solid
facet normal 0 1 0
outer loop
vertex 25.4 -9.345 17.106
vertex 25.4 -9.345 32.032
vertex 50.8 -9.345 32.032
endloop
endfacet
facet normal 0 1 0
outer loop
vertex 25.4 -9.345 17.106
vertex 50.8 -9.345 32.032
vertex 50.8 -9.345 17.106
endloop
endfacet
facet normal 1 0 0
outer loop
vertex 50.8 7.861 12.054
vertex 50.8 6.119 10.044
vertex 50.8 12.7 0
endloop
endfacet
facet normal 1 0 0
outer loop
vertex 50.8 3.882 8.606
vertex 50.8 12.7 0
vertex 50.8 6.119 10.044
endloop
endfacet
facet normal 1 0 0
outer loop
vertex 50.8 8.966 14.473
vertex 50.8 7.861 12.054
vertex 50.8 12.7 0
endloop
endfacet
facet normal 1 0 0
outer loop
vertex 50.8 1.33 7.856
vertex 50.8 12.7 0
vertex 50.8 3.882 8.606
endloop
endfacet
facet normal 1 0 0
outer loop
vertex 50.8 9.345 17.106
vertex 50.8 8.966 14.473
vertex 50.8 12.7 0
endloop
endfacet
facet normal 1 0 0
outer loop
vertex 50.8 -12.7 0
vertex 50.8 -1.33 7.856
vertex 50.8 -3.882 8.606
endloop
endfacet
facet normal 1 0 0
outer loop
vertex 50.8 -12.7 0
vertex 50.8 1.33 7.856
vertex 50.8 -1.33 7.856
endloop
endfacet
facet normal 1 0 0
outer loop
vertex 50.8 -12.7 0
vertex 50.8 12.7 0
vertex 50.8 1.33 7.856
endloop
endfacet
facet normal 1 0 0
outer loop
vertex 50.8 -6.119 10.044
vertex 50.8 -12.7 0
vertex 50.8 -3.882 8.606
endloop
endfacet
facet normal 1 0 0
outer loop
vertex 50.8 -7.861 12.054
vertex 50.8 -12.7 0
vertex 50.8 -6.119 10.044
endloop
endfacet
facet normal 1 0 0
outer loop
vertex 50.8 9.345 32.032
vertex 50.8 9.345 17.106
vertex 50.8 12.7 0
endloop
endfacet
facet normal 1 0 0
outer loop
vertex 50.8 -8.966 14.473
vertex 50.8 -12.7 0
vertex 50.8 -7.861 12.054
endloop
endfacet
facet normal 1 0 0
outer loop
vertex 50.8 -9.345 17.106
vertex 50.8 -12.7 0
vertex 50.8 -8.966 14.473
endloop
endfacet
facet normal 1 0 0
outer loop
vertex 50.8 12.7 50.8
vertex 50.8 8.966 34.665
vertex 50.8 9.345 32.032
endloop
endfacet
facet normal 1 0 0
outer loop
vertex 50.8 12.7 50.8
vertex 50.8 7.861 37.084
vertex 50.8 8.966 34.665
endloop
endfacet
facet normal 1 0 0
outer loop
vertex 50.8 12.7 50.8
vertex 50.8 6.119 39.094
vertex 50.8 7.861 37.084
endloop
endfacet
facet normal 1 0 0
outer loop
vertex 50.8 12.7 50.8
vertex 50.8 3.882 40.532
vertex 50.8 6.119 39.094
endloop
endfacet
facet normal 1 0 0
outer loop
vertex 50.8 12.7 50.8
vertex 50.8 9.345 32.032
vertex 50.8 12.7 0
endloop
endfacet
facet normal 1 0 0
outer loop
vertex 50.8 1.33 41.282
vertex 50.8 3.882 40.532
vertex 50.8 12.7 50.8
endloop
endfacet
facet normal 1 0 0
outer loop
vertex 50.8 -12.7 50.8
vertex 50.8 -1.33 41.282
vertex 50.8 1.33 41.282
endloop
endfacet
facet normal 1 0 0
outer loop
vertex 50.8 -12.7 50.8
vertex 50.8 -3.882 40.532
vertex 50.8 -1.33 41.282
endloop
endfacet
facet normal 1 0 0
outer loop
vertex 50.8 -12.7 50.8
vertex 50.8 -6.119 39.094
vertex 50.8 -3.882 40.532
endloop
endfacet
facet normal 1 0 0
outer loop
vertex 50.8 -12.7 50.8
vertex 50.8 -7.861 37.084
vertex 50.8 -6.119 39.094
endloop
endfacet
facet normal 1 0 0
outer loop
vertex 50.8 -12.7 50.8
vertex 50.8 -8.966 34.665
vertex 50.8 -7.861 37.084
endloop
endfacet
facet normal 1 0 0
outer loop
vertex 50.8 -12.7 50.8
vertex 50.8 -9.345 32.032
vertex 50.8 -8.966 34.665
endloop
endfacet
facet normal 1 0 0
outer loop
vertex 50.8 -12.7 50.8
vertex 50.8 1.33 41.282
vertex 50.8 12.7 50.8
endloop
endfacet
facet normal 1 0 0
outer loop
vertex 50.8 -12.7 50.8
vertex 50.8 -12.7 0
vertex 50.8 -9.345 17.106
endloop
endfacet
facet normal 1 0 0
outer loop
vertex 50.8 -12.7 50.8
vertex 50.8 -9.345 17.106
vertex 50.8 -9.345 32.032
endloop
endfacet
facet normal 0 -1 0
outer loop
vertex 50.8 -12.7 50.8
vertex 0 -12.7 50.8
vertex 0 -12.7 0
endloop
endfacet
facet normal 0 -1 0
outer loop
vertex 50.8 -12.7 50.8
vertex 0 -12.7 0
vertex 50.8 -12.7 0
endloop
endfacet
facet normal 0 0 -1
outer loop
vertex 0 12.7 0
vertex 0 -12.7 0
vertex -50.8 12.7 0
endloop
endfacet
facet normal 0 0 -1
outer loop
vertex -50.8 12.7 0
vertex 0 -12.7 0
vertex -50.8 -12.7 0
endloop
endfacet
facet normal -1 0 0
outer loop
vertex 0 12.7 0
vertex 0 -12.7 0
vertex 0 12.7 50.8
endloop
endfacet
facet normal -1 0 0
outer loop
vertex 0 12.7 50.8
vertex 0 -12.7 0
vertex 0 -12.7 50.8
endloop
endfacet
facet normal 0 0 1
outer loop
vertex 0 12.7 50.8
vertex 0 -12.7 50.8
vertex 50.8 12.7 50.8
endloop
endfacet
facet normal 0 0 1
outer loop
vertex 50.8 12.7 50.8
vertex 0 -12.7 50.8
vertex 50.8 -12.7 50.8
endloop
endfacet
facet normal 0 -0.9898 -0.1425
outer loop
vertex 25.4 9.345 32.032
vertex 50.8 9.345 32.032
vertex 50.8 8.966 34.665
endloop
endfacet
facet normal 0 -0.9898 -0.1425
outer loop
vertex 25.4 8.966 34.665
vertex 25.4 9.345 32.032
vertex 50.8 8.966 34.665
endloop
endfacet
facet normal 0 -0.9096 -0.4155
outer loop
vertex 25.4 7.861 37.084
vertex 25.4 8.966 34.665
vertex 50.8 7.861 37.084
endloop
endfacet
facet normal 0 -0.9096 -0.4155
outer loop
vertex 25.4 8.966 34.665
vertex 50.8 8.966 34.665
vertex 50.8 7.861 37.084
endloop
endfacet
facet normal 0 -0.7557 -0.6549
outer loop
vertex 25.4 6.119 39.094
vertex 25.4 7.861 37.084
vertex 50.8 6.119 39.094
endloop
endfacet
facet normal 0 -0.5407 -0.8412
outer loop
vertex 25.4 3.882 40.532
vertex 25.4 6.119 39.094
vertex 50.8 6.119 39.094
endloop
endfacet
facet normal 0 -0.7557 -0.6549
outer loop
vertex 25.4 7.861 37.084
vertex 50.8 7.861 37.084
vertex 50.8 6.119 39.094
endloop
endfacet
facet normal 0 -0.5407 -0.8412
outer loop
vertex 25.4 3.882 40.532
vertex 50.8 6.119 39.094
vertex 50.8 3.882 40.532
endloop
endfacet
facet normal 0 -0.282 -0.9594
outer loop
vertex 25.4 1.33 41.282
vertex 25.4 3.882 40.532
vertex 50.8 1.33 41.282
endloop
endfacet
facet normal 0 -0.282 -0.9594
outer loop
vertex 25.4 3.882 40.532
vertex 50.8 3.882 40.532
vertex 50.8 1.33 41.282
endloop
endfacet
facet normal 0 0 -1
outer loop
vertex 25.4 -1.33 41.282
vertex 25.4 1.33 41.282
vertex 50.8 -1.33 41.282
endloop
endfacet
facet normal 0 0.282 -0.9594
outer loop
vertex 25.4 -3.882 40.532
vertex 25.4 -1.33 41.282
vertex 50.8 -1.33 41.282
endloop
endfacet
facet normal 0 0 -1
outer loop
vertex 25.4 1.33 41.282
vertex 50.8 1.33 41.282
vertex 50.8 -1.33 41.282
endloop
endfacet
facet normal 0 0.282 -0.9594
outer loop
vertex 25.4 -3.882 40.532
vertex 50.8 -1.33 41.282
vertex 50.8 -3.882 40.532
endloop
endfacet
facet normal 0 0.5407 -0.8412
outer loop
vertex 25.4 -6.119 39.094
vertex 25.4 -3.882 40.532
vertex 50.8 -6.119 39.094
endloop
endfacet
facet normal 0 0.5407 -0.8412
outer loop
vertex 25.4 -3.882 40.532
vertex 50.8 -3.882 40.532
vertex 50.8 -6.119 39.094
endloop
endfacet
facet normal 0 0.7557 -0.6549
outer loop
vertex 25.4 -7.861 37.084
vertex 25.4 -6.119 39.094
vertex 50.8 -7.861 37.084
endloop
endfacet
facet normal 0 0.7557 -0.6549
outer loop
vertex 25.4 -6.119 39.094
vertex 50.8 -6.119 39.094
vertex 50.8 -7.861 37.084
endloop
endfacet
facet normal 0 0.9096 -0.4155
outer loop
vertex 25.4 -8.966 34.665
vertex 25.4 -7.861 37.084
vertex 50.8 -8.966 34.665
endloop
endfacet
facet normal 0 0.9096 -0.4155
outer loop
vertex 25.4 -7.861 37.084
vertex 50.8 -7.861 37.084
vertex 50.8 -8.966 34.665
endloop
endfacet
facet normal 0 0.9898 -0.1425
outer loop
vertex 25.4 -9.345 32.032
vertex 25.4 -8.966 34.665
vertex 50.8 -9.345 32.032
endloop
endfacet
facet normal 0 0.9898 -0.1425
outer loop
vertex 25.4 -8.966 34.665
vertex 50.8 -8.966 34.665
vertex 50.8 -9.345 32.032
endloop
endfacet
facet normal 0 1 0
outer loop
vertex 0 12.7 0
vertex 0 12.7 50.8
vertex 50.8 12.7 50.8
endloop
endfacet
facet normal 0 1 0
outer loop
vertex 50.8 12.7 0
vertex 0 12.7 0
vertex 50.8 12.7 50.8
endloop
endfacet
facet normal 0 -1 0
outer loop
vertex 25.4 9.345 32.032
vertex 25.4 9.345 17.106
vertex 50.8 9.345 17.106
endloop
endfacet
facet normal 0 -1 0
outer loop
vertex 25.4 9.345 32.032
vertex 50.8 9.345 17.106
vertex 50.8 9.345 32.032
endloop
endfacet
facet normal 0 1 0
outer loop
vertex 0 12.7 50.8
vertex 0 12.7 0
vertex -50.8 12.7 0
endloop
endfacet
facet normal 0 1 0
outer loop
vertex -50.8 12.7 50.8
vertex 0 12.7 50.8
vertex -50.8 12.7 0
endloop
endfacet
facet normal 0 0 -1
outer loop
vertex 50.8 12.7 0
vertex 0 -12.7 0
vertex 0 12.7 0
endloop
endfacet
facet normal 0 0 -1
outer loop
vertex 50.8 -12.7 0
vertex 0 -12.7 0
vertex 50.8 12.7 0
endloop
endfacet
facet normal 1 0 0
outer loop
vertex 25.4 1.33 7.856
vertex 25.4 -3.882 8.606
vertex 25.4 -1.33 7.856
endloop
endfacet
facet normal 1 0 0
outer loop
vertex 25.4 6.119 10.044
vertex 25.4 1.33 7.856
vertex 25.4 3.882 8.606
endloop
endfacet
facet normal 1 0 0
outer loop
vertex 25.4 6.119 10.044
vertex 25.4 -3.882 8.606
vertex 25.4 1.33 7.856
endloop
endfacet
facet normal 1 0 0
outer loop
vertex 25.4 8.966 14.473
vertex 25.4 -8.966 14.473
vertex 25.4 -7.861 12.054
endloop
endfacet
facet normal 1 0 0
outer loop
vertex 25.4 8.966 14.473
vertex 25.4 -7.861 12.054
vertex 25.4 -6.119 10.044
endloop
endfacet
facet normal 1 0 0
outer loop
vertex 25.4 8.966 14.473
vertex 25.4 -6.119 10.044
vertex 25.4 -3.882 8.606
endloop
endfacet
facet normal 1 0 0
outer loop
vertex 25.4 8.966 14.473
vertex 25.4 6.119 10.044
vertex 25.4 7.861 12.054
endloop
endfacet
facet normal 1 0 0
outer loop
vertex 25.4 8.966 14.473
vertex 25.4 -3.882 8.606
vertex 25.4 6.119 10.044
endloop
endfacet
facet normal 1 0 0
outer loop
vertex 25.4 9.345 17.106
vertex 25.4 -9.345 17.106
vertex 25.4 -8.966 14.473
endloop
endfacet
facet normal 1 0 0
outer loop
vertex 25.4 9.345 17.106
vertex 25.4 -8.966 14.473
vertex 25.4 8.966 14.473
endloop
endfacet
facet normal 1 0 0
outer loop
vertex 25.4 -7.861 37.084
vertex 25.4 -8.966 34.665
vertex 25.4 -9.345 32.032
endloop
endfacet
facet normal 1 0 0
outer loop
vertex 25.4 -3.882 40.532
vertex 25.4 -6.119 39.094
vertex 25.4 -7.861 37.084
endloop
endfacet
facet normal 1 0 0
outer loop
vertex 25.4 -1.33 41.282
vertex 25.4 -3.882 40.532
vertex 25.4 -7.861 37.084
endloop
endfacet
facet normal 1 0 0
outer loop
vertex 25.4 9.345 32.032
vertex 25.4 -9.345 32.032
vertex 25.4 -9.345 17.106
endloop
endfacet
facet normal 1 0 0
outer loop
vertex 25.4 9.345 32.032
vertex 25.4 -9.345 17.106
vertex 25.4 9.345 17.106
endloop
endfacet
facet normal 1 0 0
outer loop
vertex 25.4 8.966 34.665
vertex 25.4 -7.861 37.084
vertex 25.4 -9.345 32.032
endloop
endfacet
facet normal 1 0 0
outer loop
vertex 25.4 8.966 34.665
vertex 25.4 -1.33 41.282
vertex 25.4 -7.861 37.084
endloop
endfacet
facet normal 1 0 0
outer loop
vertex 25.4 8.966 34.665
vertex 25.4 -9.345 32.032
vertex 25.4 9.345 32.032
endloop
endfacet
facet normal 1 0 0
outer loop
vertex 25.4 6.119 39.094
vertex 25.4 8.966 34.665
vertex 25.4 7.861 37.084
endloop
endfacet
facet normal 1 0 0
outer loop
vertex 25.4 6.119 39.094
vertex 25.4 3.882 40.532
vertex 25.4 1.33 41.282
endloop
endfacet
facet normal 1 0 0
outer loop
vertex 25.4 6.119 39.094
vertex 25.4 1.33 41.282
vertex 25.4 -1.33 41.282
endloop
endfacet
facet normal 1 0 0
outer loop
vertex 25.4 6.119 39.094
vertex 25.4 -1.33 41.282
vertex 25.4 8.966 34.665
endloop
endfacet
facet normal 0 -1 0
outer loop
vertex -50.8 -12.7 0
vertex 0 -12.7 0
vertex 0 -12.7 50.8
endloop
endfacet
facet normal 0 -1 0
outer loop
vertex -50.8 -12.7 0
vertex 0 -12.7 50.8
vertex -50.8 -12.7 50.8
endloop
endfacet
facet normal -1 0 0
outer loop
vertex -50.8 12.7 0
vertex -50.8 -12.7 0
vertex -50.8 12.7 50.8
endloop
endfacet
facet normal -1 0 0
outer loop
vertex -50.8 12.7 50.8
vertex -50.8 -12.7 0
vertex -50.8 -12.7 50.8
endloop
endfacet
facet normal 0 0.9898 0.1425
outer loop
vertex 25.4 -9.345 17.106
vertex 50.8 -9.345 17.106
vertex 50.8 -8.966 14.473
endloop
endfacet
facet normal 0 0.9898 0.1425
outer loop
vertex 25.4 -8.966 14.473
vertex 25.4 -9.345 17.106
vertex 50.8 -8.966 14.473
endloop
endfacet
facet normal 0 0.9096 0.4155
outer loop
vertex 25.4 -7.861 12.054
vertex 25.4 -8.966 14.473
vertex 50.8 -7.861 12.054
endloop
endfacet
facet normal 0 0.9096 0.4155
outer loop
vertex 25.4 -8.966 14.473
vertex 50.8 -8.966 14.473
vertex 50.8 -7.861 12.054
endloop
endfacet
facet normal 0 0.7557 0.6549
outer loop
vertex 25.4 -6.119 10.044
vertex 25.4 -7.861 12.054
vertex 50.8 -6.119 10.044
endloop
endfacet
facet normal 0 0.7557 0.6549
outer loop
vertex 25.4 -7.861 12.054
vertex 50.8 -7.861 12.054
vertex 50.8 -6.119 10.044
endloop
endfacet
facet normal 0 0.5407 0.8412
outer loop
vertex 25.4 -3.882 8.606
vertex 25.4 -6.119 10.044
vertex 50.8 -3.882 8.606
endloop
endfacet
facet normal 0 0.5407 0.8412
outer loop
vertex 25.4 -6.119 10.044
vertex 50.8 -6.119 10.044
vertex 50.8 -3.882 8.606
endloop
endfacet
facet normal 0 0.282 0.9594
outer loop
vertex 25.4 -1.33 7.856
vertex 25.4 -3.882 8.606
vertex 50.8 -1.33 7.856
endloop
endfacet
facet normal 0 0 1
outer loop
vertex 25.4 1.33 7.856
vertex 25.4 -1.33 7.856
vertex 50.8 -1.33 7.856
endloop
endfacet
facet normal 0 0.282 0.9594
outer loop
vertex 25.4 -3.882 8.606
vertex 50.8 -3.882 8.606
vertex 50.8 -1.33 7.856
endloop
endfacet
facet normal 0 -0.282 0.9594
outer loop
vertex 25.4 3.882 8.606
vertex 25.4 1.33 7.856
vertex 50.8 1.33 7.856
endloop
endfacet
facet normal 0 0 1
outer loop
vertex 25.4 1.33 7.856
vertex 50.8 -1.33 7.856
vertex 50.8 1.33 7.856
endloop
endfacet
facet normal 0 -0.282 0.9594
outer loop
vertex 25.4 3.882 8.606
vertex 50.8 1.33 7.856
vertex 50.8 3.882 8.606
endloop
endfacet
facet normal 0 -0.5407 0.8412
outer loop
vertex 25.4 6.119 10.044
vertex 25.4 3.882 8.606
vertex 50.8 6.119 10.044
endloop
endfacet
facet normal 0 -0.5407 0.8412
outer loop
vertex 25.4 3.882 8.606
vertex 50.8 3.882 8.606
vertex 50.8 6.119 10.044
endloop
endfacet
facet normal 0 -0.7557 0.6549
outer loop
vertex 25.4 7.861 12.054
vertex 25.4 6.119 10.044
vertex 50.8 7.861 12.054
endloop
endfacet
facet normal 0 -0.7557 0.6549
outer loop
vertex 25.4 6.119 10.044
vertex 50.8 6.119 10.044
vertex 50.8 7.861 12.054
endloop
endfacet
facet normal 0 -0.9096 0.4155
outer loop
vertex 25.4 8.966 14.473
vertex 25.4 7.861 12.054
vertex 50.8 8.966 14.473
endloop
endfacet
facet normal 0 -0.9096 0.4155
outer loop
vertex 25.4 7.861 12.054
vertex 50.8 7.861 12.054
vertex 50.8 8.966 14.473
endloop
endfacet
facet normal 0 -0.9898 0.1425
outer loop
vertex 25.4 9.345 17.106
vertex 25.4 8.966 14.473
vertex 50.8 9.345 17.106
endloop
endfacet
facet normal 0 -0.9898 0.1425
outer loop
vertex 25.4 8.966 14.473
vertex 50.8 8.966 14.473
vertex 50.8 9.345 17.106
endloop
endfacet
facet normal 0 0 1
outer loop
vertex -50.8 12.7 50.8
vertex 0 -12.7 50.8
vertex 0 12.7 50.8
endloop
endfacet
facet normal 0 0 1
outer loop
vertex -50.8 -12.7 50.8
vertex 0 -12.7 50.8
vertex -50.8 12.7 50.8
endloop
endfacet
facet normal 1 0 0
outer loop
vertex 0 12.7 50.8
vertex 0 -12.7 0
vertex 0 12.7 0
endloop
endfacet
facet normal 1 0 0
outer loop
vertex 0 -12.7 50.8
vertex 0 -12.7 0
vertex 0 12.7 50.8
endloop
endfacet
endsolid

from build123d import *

# Parameters (mm, degrees)
F0_W     = 50.8
F0_H     = 50.8
F1_DEPTH = 12.7
F4_DEPTH = 25.4


with BuildPart() as f1:
    # F0 (on Front) → F1 (new body, symmetric)
    with BuildSketch(Plane.XZ):
        with Locations((25.4, 25.4)):
            Rectangle(F0_W, F0_H)
    extrude(amount=F1_DEPTH, both=True)


with BuildPart() as f2_1:
    # F2: instance of F1
    add(f1.part.mirror(Plane.YZ))


with BuildPart() as f1_1:
    add(f1.part)

    # F3 (on face) → F4 (cut)
    with BuildSketch(Plane.YZ.offset(50.8)):
        with BuildLine():
            ThreePointArc((9.344614426, 32.0321582258), (0, 41.3767726518), (-9.344614426, 32.0321582258))
            Line((-9.344614426, 32.0321582258), (-9.344614426, 17.1057507396))
            ThreePointArc((-9.344614426, 17.1057507396), (0, 7.7611363136), (9.344614426, 17.1057507396))
            Line((9.344614426, 17.1057507396), (9.344614426, 32.0321582258))
        make_face()
    extrude(amount=-F4_DEPTH, mode=Mode.SUBTRACT)


solid = Compound([f2_1.part, f1_1.part])
